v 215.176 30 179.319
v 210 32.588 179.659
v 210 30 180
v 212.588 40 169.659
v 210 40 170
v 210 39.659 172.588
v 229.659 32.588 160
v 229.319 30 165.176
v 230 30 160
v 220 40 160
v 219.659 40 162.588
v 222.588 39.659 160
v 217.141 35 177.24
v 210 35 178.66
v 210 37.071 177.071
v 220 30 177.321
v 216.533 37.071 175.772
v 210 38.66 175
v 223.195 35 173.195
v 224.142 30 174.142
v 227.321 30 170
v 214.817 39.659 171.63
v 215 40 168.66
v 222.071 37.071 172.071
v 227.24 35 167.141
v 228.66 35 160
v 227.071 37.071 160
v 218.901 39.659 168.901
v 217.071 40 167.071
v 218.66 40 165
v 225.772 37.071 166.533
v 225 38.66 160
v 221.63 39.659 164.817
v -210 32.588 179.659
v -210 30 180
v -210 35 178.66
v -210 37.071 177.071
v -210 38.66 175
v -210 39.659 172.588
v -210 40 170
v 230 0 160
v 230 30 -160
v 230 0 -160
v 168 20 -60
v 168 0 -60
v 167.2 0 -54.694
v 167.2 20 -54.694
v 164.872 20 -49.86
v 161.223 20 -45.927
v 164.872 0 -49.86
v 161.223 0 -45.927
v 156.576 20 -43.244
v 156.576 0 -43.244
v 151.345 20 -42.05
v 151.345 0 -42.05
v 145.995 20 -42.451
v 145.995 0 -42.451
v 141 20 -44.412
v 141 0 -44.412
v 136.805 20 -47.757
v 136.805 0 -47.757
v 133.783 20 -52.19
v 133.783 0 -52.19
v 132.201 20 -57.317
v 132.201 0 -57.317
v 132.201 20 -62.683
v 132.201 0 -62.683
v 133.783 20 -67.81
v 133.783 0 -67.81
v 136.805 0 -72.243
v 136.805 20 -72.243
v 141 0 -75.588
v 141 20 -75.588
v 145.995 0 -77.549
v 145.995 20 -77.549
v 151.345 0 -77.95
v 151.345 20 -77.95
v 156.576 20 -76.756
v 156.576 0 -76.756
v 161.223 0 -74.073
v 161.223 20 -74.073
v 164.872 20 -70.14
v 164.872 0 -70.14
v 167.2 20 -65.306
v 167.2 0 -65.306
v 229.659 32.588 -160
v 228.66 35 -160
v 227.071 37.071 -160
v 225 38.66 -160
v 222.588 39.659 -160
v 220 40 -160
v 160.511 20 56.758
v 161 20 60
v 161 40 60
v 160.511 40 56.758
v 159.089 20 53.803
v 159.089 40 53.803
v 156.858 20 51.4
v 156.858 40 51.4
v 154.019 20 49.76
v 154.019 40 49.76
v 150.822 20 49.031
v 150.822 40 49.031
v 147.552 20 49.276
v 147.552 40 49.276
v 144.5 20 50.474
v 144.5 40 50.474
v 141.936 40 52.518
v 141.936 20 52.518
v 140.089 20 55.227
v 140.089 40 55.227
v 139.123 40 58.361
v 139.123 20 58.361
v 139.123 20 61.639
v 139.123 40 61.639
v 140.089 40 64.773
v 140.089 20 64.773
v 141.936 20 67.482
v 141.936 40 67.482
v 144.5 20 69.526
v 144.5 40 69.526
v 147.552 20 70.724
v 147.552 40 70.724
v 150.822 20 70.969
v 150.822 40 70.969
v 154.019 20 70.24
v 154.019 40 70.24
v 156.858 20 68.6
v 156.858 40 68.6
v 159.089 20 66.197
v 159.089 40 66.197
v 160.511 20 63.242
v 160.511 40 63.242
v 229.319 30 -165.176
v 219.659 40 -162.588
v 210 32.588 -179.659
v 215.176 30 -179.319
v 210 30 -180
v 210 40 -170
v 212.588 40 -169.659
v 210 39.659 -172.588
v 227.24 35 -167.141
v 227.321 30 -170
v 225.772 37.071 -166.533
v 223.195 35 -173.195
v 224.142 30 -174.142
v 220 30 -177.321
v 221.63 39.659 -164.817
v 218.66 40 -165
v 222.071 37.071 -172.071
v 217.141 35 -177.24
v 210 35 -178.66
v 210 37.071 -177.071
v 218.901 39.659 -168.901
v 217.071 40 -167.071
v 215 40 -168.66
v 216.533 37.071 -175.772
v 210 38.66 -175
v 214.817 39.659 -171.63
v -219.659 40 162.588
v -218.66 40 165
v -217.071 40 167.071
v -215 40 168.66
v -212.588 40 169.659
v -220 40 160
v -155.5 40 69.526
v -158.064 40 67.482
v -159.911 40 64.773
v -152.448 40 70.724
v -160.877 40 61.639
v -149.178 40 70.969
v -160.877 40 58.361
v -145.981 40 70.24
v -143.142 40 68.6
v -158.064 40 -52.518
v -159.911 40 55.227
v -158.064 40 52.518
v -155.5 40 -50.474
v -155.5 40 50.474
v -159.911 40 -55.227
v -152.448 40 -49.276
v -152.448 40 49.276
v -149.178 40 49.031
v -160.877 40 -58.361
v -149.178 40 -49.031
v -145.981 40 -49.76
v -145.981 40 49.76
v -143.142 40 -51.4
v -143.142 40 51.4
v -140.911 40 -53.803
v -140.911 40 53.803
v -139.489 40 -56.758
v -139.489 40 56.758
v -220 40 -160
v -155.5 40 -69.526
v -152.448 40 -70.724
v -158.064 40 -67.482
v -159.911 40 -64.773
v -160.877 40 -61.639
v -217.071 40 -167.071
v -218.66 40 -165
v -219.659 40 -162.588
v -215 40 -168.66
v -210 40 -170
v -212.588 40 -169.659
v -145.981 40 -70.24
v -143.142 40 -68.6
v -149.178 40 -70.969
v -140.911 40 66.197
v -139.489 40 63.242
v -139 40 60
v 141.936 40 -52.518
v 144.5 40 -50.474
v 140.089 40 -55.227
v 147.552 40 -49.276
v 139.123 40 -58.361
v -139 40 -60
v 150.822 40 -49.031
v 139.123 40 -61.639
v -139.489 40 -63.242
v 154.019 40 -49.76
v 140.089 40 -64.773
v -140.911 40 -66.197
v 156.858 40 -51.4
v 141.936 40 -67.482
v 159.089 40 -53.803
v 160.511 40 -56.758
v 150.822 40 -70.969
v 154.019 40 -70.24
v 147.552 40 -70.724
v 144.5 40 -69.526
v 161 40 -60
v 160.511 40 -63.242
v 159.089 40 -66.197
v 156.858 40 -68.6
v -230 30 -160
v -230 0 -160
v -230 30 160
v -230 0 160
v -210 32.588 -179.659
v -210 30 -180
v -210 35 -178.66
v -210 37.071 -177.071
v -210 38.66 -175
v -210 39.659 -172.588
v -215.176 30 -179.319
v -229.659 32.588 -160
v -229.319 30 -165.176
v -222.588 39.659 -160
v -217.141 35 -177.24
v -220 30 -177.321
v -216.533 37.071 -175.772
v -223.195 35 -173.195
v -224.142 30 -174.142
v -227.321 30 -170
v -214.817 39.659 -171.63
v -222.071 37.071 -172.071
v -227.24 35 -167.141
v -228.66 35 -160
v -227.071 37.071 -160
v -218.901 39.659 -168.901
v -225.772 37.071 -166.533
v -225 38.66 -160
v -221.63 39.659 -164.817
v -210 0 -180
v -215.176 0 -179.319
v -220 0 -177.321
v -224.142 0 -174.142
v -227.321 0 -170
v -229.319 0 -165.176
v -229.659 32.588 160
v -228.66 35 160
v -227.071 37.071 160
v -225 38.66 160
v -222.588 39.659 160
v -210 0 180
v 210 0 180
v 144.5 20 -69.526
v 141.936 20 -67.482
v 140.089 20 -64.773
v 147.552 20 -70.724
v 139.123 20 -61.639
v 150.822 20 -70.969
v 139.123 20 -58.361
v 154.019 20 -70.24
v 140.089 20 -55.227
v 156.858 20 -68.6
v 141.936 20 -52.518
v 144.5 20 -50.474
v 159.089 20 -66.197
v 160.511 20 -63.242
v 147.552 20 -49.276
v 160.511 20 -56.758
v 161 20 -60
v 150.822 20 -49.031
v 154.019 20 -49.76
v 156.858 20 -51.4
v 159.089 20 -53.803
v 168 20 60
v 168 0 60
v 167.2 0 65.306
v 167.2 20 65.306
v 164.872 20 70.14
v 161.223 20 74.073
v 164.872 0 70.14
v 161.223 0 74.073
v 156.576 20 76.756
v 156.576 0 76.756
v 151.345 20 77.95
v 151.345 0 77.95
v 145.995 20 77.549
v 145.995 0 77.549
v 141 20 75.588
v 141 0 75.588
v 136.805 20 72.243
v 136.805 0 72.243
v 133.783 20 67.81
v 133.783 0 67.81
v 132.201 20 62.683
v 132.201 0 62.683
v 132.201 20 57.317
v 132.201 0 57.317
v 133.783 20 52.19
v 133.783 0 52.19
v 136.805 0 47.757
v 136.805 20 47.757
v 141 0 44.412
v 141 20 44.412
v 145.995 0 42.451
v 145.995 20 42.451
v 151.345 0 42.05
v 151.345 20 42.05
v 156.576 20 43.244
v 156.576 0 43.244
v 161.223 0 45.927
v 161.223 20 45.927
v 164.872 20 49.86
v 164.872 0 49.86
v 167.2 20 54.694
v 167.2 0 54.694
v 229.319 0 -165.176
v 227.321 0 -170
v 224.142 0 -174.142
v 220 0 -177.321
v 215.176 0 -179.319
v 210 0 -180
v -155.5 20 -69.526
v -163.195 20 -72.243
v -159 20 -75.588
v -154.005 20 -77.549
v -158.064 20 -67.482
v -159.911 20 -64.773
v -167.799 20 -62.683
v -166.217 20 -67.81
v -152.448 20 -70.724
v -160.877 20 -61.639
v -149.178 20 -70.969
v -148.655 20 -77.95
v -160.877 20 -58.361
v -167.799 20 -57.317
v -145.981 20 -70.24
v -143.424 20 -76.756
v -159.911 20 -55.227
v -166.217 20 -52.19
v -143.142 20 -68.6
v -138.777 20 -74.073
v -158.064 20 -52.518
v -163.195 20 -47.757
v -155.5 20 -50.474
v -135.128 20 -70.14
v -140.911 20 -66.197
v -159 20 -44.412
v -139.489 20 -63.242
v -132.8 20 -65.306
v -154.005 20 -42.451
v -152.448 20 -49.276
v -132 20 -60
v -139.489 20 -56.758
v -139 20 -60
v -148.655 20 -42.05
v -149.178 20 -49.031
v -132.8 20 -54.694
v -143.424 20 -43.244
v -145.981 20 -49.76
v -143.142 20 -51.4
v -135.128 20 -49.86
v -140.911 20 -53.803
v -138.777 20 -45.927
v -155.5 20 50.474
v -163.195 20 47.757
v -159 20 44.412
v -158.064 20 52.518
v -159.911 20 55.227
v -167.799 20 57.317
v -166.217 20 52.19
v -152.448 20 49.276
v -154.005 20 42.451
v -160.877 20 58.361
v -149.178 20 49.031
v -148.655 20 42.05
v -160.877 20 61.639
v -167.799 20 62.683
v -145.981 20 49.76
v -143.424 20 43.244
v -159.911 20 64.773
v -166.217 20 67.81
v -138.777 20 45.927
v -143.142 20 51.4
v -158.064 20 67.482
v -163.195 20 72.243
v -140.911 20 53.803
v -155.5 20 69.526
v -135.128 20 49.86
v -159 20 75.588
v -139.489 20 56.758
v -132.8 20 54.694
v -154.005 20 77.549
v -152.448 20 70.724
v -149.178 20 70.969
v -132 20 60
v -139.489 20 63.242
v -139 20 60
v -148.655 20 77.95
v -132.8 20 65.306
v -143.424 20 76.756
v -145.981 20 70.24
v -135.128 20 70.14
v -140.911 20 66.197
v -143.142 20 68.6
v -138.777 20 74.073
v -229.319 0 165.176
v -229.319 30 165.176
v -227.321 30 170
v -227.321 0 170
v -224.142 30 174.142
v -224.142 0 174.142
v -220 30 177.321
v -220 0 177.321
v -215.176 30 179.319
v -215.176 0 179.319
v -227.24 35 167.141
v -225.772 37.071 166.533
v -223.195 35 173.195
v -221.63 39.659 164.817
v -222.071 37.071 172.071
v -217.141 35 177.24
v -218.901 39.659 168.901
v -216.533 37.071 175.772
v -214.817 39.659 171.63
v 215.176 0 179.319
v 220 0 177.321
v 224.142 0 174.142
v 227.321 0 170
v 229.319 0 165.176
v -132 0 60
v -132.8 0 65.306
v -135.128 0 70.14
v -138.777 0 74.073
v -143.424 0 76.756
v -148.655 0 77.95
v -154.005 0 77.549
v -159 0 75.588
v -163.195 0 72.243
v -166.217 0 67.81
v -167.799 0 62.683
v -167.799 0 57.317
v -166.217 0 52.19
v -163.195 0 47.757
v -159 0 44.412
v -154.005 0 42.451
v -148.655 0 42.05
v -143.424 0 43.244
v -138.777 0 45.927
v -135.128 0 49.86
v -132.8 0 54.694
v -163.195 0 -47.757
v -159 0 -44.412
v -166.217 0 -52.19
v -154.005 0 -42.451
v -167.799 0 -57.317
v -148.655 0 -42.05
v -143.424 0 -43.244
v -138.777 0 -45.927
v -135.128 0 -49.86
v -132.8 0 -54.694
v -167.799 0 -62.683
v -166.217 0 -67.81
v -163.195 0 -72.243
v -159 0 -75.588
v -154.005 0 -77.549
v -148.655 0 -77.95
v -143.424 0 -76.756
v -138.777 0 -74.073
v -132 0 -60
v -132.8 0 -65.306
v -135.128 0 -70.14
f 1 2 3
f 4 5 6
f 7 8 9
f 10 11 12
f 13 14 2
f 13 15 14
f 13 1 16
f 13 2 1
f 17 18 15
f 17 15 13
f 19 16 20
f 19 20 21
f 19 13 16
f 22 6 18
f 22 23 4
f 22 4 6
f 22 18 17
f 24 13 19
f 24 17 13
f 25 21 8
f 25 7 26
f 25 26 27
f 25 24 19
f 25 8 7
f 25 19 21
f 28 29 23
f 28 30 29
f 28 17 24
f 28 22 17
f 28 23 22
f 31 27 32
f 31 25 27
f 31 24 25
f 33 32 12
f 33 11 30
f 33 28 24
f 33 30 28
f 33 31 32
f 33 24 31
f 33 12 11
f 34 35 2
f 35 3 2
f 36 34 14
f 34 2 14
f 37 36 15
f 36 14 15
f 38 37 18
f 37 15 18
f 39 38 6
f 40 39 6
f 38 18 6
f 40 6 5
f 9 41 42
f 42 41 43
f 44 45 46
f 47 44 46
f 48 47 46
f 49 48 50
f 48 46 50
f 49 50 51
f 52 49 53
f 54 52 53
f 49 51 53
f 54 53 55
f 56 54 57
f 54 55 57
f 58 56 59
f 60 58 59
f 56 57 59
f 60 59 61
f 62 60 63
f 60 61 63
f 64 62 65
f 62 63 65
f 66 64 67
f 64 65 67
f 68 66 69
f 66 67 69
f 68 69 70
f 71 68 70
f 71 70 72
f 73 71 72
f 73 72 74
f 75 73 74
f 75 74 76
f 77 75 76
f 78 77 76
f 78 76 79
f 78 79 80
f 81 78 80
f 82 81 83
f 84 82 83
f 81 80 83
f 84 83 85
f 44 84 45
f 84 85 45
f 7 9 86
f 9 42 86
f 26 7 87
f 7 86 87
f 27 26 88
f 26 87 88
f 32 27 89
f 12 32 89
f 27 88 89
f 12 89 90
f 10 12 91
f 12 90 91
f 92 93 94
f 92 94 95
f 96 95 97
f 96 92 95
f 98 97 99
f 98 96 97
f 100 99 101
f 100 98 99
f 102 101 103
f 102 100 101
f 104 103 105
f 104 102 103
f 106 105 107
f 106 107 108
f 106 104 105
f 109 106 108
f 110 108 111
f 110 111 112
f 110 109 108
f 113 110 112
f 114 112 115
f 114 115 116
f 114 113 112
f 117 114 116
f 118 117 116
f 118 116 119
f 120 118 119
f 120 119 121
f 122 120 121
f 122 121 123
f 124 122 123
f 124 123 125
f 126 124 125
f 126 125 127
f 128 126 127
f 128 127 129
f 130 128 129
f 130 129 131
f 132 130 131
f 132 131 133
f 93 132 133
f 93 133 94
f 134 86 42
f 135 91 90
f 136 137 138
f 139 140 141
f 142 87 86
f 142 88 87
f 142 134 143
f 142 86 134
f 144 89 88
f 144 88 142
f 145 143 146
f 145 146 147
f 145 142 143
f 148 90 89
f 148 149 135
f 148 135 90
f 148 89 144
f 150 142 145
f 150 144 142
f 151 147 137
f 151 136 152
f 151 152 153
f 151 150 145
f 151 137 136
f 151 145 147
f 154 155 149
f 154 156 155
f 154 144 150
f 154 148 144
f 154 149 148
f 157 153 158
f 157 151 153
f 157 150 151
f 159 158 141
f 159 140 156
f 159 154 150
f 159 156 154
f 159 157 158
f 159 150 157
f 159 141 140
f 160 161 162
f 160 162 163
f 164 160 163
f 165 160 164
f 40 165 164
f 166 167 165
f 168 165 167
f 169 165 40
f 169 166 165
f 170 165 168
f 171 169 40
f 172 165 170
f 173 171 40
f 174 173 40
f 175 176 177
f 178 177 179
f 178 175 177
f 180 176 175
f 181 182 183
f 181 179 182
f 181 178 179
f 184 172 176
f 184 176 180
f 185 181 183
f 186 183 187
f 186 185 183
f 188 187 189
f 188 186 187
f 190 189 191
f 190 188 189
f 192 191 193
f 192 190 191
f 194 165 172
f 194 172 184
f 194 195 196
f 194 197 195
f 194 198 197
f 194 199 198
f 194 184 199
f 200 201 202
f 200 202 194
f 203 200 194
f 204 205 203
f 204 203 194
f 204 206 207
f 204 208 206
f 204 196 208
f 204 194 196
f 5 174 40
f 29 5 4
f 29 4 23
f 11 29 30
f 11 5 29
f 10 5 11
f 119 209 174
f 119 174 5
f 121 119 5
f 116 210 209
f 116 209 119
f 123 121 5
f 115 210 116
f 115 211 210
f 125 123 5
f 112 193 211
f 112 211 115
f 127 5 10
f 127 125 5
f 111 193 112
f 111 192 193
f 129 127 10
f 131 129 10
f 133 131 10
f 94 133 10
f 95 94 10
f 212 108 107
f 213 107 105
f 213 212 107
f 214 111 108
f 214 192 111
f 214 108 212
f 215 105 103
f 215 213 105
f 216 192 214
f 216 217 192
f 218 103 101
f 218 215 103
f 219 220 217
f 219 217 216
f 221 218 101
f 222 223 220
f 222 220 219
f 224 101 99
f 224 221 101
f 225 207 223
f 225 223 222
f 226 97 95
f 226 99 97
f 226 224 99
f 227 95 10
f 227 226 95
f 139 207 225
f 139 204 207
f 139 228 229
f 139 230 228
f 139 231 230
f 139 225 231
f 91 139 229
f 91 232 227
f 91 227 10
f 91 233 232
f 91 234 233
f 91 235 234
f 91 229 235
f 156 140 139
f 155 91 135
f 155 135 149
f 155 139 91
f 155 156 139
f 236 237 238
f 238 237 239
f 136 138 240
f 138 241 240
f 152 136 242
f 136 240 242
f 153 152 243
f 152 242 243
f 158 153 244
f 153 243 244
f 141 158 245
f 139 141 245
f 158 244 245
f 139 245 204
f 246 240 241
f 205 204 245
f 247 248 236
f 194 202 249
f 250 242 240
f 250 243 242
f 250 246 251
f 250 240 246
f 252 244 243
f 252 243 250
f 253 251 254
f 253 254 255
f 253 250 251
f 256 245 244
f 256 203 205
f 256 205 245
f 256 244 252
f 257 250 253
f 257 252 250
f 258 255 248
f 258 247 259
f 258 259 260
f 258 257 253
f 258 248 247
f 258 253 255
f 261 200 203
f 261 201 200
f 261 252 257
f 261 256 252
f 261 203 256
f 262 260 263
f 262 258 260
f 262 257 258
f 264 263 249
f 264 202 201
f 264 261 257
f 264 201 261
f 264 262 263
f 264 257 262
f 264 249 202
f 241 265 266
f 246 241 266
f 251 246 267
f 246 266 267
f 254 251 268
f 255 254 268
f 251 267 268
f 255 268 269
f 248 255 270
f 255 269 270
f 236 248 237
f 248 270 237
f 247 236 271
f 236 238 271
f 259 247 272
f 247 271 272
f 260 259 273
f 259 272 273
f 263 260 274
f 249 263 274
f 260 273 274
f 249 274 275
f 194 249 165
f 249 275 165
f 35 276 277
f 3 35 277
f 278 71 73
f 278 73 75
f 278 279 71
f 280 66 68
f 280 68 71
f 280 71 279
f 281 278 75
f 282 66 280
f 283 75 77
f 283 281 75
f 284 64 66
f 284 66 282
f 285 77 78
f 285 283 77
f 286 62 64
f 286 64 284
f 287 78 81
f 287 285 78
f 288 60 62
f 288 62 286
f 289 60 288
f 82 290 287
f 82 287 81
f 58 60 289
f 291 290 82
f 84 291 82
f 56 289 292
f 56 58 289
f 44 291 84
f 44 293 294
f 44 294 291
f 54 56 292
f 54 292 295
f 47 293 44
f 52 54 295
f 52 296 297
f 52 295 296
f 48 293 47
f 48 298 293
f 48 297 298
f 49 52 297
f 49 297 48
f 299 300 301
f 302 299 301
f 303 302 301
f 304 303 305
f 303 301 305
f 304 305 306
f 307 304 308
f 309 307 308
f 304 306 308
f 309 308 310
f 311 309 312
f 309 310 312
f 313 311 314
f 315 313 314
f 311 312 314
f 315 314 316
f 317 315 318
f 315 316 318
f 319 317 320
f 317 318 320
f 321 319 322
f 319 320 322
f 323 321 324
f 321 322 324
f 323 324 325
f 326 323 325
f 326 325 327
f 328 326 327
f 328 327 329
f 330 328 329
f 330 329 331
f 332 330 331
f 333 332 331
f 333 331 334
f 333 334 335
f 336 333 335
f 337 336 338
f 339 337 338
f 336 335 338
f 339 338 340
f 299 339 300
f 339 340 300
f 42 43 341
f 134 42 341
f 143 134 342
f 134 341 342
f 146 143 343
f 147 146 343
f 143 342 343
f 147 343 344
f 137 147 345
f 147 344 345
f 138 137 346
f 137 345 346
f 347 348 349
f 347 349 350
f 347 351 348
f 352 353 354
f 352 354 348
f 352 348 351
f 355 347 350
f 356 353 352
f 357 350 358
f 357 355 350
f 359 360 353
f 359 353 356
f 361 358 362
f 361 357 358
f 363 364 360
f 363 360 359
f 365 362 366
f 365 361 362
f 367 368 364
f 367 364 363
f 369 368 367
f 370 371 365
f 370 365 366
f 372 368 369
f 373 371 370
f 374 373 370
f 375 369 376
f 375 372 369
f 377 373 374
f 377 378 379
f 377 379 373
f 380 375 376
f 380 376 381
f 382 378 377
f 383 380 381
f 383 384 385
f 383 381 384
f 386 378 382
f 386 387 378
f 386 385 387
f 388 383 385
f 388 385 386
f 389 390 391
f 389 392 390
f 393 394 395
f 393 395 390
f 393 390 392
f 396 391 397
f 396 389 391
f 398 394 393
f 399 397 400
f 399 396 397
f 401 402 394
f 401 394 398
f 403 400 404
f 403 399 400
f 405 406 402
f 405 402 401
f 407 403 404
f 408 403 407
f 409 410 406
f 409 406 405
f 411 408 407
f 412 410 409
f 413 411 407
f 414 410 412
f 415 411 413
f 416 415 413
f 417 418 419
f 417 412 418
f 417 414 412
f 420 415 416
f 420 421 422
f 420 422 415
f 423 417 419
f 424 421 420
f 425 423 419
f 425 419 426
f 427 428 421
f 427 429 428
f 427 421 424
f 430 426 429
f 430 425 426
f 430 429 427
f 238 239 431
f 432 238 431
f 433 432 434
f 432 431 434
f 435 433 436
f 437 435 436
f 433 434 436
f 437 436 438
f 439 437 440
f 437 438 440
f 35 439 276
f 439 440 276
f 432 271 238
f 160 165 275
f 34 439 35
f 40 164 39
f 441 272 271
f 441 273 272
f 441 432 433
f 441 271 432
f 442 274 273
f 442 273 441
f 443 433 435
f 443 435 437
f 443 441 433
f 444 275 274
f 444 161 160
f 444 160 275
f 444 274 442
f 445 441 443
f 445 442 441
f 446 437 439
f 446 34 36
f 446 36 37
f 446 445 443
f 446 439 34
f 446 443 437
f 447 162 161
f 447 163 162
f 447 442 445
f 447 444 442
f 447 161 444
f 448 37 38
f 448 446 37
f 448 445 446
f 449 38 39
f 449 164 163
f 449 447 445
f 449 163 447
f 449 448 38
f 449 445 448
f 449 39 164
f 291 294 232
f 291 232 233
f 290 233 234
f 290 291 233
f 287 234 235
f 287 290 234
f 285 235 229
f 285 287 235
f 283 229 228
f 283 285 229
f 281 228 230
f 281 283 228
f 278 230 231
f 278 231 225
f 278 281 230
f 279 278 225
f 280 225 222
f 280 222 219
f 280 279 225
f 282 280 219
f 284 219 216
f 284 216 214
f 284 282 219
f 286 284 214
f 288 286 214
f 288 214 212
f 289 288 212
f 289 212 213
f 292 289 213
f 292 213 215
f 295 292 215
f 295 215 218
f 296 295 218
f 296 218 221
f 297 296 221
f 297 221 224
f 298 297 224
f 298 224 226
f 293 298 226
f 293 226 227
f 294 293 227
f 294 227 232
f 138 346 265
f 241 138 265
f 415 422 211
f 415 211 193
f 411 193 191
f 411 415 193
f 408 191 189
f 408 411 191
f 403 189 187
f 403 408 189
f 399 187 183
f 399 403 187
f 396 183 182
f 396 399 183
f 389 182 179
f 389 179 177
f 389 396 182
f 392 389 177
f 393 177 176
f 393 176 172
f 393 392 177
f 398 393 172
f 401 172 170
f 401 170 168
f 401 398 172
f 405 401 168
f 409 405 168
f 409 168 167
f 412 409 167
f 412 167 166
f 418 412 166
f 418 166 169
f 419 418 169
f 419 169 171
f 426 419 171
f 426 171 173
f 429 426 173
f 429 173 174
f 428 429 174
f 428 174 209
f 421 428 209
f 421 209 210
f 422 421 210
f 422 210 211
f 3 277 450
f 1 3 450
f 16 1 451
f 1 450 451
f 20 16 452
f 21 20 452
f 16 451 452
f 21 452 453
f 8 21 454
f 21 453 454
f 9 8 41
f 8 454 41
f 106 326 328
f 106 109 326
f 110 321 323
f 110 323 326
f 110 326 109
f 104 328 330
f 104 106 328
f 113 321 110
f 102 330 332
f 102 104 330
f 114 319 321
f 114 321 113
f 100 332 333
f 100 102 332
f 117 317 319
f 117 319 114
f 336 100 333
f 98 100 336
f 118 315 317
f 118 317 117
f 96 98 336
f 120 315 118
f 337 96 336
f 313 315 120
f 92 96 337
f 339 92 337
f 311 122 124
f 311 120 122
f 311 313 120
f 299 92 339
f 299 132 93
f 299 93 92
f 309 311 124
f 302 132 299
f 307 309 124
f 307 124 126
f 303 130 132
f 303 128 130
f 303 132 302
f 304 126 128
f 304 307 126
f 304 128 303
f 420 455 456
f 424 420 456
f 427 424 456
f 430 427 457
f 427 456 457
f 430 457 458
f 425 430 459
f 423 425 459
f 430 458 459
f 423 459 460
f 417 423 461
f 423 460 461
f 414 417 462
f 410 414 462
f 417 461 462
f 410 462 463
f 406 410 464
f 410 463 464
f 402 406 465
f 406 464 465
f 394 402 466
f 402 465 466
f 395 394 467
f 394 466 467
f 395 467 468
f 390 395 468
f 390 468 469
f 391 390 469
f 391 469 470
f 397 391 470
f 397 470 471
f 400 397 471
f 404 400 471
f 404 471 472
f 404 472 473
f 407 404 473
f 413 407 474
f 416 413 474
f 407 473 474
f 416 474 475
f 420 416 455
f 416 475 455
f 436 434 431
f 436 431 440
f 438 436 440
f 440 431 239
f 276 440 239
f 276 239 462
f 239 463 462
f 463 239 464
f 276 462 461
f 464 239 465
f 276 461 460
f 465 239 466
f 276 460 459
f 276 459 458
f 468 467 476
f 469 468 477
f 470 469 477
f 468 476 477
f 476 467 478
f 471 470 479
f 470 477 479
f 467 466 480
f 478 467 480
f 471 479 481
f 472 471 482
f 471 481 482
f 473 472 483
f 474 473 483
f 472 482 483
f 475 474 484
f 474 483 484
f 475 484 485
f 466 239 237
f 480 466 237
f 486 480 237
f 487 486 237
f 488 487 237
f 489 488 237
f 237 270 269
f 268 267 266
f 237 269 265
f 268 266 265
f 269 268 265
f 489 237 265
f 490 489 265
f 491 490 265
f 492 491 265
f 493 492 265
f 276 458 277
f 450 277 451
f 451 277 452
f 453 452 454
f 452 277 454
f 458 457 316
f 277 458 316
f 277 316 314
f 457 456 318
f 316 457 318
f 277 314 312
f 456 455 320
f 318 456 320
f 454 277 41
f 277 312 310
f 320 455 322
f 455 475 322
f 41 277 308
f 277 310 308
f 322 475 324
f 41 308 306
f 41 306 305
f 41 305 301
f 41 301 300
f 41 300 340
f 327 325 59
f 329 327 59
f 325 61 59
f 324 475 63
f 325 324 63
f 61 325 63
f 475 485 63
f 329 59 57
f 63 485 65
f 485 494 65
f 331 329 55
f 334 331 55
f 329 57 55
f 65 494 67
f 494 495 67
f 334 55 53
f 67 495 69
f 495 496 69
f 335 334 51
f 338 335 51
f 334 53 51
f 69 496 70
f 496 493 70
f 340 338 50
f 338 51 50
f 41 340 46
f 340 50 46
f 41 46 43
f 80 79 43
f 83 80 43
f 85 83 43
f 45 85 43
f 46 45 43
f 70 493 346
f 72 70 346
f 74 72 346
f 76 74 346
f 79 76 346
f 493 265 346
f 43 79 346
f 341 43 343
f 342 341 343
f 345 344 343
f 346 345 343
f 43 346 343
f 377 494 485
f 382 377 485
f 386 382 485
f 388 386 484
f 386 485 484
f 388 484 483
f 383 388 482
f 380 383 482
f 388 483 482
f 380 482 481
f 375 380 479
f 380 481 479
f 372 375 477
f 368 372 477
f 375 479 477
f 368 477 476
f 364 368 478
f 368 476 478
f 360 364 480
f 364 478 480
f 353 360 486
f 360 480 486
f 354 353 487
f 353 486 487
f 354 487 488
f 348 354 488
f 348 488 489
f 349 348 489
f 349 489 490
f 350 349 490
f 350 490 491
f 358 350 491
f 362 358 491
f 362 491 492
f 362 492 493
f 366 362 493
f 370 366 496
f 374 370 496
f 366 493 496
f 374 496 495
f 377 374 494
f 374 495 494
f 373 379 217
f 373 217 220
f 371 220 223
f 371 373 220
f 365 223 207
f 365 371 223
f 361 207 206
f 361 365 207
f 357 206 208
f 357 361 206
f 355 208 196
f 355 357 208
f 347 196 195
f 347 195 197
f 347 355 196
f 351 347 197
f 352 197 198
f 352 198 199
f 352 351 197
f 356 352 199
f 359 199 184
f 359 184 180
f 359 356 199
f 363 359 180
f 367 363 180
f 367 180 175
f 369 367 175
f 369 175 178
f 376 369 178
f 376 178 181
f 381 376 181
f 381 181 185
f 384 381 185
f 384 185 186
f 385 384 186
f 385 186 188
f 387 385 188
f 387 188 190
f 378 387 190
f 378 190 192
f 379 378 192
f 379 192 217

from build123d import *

# Parameters (mm, degrees)
SKETCH1_R            = 11
BOSS_EXTRUDE1_DEPTH  = 40
FILLET1_R            = 10
SKETCH2_R            = 18
CUT_EXTRUDE1_DEPTH   = 20
LPATTERN1_COUNT      = 2
LPATTERN1_PITCH      = 300
LPATTERN1_COUNT_DIR2 = 2
LPATTERN1_PITCH_DIR2 = 120


with BuildPart() as part:
    # Sketch1 → Boss-Extrude1 (new body)
    with BuildSketch(Plane(origin=(0, 0, 0), x_dir=(1, 0, 0), z_dir=(0, 1, 0))):
        with BuildLine():
            Line((-210, -180), (210, -180))
            ThreePointArc((210, -180), (224.142135624, -174.142135624), (230, -160))
            Line((230, -160), (230, 160))
            ThreePointArc((230, 160), (224.142135624, 174.142135624), (210, 180))
            Line((210, 180), (-210, 180))
            ThreePointArc((-210, 180), (-224.142135624, 174.142135624), (-230, 160))
            Line((-230, 160), (-230, -160))
            ThreePointArc((-230, -160), (-224.142135624, -174.142135624), (-210, -180))
        make_face()
        with Locations((-150, 60)):
            Circle(SKETCH1_R, mode=Mode.SUBTRACT)
        with Locations((-150, -60)):
            Circle(SKETCH1_R, mode=Mode.SUBTRACT)
        with Locations((150, -60)):
            Circle(SKETCH1_R, mode=Mode.SUBTRACT)
        with Locations((150, 60)):
            Circle(SKETCH1_R, mode=Mode.SUBTRACT)
    extrude(amount=BOSS_EXTRUDE1_DEPTH)

    # Fillet1
    fillet1_edges = [part.edges().sort_by_distance(p)[0] for p in [
        (224.142135624, 40, 174.142135624),
        (230, 40, 0),
        (224.142135624, 40, -174.142135624),
        (0, 40, -180),
        (-224.142135624, 40, -174.142135624),
        (-230, 40, 0),
        (-224.142135624, 40, 174.142135624),
        (0, 40, 180),
    ]]
    fillet(fillet1_edges, radius=FILLET1_R)

    # Sketch2 → Cut-Extrude1 (cut)
    with BuildSketch(Plane.XZ):
        with Locations((-150, 60)):
            Circle(SKETCH2_R)
    cut_extrude1 = extrude(amount=-CUT_EXTRUDE1_DEPTH, mode=Mode.SUBTRACT)

    # LPattern1: Cut-Extrude1 2 × 2
    with Locations(*[(i * LPATTERN1_PITCH, 0, -j * LPATTERN1_PITCH_DIR2) for i in range(LPATTERN1_COUNT) for j in range(LPATTERN1_COUNT_DIR2) if (i, j) != (0, 0)]):
        add(cut_extrude1, mode=Mode.SUBTRACT)


solid = part.part
